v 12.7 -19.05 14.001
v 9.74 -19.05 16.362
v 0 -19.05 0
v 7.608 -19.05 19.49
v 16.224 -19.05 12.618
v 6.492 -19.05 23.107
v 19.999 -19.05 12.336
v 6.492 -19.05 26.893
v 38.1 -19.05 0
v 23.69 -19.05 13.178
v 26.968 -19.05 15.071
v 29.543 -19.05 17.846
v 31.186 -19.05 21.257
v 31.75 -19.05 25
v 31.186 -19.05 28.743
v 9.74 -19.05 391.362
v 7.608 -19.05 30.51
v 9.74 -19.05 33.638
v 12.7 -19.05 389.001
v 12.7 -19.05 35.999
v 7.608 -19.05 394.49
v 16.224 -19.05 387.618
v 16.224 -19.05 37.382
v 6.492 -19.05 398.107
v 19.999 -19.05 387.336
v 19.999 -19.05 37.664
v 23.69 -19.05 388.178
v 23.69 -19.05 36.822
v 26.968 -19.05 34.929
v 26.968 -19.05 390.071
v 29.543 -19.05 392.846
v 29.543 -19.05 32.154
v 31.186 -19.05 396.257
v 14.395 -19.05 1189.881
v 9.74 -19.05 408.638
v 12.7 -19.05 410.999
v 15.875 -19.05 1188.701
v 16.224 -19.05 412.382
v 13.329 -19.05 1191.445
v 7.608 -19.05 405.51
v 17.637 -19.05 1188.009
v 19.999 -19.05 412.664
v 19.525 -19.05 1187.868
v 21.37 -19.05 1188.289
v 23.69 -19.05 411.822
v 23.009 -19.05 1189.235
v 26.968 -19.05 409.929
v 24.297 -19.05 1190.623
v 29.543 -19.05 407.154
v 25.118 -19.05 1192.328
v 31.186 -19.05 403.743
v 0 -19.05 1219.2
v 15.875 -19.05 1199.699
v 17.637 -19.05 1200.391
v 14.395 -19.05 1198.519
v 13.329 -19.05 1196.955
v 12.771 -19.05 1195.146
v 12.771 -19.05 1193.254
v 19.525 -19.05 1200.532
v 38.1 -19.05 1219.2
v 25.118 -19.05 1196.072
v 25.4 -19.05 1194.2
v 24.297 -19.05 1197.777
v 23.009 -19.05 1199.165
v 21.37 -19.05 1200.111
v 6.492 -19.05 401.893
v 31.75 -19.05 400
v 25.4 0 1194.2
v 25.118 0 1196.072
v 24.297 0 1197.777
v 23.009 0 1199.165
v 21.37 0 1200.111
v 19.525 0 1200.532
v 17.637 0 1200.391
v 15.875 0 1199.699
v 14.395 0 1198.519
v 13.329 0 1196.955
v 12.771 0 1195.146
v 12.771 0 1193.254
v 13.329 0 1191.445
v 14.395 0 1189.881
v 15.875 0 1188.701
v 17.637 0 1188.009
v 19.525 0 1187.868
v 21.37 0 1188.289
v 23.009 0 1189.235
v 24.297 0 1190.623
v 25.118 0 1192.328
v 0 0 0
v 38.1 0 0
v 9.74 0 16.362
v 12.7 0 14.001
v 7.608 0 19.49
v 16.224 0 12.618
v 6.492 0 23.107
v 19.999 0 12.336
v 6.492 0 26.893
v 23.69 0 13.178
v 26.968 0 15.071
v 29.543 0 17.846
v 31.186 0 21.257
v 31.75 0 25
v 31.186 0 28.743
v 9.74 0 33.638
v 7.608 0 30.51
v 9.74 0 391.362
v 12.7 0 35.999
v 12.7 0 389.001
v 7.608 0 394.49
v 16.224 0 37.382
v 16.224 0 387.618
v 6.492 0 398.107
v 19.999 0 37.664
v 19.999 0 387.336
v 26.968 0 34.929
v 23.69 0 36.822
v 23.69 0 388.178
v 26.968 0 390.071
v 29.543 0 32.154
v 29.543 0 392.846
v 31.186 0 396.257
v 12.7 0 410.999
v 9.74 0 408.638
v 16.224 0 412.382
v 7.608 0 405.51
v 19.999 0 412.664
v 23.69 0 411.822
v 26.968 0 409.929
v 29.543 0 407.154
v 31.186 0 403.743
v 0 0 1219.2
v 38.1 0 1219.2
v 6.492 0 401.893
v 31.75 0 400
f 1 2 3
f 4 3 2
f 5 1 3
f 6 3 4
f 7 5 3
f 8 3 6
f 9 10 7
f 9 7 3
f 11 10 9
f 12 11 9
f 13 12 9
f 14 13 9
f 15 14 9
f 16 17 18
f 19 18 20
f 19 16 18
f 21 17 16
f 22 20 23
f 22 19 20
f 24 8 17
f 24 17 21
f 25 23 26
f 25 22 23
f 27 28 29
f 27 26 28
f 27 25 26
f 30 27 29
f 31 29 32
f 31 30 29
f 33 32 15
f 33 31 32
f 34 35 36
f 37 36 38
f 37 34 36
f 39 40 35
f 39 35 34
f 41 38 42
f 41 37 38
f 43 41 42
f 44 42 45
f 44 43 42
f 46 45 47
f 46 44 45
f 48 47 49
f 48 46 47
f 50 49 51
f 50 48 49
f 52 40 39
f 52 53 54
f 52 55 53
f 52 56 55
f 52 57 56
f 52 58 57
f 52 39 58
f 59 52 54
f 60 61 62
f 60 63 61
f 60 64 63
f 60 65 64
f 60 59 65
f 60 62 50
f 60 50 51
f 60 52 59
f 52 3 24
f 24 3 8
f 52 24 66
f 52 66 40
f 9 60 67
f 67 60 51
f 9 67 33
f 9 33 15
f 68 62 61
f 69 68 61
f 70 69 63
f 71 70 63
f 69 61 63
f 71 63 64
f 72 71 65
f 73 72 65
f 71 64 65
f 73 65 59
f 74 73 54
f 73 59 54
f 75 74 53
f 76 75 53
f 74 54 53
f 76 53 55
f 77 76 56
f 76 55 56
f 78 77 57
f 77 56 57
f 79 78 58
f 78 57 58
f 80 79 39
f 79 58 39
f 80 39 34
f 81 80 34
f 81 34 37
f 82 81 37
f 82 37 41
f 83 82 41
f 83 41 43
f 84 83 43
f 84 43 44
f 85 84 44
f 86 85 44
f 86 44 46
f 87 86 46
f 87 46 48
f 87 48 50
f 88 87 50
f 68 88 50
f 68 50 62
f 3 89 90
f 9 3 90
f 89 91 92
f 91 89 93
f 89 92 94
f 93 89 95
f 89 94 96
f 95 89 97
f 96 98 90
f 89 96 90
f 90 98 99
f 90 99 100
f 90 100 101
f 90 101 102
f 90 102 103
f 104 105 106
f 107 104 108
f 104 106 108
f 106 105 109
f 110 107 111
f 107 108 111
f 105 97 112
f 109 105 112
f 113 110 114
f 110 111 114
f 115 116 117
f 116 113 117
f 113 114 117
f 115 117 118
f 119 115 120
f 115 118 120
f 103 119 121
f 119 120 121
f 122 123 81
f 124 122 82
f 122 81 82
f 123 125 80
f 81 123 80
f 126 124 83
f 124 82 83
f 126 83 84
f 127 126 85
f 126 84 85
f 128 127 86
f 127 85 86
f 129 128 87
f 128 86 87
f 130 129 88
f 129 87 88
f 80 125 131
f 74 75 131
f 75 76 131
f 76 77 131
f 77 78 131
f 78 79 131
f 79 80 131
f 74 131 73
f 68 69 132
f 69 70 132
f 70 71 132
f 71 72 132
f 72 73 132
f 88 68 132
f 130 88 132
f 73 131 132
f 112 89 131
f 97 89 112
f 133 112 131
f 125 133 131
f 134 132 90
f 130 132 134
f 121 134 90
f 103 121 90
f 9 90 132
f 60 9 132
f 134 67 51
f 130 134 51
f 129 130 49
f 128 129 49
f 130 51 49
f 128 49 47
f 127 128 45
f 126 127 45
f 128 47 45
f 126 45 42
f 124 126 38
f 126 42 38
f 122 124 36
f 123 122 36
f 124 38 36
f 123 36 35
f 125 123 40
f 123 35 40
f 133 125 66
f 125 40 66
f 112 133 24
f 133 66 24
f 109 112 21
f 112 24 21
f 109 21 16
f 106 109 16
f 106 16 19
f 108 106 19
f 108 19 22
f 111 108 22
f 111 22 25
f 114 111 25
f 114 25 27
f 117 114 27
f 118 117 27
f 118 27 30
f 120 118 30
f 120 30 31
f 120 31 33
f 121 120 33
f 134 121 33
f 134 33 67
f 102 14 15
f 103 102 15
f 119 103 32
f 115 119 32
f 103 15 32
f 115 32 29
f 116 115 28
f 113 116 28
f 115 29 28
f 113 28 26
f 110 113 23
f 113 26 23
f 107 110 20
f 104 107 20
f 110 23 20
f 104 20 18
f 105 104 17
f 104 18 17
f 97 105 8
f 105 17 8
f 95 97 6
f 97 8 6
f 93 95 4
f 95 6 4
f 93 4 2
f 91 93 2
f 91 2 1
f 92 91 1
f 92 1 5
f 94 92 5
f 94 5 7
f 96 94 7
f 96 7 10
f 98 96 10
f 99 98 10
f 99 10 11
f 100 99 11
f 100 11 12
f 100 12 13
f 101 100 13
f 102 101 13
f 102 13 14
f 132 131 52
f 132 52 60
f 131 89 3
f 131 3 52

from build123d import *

# Parameters (mm, degrees)
F0_W     = 38.1
F0_H     = 1219.2
F1_DEPTH = 19.05
F2_R     = 12.7
F3_DEPTH = 25
F4_R     = 6.35
F4_R_2   = 12.7
F5_DEPTH = 25


with BuildPart() as f1:
    # F0 (on Front) → F1 (new body)
    with BuildSketch(Plane.XZ):
        with Locations((19.05, 609.6)):
            Rectangle(F0_W, F0_H)
    extrude(amount=F1_DEPTH)

    # F2 (on face) → F3 (cut)
    with BuildSketch(Plane.XZ.offset(19.05)):
        with Locations((19.05, 400)):
            Circle(F2_R)
    extrude(amount=-F3_DEPTH, mode=Mode.SUBTRACT)

    # F4 (on face) → F5 (cut)
    with BuildSketch(Plane.XZ.offset(19.05)):
        with Locations((19.05, 1194.2)):
            Circle(F4_R)
        with Locations((19.05, 25)):
            Circle(F4_R_2)
    extrude(amount=-F5_DEPTH, mode=Mode.SUBTRACT)


solid = f1.part
